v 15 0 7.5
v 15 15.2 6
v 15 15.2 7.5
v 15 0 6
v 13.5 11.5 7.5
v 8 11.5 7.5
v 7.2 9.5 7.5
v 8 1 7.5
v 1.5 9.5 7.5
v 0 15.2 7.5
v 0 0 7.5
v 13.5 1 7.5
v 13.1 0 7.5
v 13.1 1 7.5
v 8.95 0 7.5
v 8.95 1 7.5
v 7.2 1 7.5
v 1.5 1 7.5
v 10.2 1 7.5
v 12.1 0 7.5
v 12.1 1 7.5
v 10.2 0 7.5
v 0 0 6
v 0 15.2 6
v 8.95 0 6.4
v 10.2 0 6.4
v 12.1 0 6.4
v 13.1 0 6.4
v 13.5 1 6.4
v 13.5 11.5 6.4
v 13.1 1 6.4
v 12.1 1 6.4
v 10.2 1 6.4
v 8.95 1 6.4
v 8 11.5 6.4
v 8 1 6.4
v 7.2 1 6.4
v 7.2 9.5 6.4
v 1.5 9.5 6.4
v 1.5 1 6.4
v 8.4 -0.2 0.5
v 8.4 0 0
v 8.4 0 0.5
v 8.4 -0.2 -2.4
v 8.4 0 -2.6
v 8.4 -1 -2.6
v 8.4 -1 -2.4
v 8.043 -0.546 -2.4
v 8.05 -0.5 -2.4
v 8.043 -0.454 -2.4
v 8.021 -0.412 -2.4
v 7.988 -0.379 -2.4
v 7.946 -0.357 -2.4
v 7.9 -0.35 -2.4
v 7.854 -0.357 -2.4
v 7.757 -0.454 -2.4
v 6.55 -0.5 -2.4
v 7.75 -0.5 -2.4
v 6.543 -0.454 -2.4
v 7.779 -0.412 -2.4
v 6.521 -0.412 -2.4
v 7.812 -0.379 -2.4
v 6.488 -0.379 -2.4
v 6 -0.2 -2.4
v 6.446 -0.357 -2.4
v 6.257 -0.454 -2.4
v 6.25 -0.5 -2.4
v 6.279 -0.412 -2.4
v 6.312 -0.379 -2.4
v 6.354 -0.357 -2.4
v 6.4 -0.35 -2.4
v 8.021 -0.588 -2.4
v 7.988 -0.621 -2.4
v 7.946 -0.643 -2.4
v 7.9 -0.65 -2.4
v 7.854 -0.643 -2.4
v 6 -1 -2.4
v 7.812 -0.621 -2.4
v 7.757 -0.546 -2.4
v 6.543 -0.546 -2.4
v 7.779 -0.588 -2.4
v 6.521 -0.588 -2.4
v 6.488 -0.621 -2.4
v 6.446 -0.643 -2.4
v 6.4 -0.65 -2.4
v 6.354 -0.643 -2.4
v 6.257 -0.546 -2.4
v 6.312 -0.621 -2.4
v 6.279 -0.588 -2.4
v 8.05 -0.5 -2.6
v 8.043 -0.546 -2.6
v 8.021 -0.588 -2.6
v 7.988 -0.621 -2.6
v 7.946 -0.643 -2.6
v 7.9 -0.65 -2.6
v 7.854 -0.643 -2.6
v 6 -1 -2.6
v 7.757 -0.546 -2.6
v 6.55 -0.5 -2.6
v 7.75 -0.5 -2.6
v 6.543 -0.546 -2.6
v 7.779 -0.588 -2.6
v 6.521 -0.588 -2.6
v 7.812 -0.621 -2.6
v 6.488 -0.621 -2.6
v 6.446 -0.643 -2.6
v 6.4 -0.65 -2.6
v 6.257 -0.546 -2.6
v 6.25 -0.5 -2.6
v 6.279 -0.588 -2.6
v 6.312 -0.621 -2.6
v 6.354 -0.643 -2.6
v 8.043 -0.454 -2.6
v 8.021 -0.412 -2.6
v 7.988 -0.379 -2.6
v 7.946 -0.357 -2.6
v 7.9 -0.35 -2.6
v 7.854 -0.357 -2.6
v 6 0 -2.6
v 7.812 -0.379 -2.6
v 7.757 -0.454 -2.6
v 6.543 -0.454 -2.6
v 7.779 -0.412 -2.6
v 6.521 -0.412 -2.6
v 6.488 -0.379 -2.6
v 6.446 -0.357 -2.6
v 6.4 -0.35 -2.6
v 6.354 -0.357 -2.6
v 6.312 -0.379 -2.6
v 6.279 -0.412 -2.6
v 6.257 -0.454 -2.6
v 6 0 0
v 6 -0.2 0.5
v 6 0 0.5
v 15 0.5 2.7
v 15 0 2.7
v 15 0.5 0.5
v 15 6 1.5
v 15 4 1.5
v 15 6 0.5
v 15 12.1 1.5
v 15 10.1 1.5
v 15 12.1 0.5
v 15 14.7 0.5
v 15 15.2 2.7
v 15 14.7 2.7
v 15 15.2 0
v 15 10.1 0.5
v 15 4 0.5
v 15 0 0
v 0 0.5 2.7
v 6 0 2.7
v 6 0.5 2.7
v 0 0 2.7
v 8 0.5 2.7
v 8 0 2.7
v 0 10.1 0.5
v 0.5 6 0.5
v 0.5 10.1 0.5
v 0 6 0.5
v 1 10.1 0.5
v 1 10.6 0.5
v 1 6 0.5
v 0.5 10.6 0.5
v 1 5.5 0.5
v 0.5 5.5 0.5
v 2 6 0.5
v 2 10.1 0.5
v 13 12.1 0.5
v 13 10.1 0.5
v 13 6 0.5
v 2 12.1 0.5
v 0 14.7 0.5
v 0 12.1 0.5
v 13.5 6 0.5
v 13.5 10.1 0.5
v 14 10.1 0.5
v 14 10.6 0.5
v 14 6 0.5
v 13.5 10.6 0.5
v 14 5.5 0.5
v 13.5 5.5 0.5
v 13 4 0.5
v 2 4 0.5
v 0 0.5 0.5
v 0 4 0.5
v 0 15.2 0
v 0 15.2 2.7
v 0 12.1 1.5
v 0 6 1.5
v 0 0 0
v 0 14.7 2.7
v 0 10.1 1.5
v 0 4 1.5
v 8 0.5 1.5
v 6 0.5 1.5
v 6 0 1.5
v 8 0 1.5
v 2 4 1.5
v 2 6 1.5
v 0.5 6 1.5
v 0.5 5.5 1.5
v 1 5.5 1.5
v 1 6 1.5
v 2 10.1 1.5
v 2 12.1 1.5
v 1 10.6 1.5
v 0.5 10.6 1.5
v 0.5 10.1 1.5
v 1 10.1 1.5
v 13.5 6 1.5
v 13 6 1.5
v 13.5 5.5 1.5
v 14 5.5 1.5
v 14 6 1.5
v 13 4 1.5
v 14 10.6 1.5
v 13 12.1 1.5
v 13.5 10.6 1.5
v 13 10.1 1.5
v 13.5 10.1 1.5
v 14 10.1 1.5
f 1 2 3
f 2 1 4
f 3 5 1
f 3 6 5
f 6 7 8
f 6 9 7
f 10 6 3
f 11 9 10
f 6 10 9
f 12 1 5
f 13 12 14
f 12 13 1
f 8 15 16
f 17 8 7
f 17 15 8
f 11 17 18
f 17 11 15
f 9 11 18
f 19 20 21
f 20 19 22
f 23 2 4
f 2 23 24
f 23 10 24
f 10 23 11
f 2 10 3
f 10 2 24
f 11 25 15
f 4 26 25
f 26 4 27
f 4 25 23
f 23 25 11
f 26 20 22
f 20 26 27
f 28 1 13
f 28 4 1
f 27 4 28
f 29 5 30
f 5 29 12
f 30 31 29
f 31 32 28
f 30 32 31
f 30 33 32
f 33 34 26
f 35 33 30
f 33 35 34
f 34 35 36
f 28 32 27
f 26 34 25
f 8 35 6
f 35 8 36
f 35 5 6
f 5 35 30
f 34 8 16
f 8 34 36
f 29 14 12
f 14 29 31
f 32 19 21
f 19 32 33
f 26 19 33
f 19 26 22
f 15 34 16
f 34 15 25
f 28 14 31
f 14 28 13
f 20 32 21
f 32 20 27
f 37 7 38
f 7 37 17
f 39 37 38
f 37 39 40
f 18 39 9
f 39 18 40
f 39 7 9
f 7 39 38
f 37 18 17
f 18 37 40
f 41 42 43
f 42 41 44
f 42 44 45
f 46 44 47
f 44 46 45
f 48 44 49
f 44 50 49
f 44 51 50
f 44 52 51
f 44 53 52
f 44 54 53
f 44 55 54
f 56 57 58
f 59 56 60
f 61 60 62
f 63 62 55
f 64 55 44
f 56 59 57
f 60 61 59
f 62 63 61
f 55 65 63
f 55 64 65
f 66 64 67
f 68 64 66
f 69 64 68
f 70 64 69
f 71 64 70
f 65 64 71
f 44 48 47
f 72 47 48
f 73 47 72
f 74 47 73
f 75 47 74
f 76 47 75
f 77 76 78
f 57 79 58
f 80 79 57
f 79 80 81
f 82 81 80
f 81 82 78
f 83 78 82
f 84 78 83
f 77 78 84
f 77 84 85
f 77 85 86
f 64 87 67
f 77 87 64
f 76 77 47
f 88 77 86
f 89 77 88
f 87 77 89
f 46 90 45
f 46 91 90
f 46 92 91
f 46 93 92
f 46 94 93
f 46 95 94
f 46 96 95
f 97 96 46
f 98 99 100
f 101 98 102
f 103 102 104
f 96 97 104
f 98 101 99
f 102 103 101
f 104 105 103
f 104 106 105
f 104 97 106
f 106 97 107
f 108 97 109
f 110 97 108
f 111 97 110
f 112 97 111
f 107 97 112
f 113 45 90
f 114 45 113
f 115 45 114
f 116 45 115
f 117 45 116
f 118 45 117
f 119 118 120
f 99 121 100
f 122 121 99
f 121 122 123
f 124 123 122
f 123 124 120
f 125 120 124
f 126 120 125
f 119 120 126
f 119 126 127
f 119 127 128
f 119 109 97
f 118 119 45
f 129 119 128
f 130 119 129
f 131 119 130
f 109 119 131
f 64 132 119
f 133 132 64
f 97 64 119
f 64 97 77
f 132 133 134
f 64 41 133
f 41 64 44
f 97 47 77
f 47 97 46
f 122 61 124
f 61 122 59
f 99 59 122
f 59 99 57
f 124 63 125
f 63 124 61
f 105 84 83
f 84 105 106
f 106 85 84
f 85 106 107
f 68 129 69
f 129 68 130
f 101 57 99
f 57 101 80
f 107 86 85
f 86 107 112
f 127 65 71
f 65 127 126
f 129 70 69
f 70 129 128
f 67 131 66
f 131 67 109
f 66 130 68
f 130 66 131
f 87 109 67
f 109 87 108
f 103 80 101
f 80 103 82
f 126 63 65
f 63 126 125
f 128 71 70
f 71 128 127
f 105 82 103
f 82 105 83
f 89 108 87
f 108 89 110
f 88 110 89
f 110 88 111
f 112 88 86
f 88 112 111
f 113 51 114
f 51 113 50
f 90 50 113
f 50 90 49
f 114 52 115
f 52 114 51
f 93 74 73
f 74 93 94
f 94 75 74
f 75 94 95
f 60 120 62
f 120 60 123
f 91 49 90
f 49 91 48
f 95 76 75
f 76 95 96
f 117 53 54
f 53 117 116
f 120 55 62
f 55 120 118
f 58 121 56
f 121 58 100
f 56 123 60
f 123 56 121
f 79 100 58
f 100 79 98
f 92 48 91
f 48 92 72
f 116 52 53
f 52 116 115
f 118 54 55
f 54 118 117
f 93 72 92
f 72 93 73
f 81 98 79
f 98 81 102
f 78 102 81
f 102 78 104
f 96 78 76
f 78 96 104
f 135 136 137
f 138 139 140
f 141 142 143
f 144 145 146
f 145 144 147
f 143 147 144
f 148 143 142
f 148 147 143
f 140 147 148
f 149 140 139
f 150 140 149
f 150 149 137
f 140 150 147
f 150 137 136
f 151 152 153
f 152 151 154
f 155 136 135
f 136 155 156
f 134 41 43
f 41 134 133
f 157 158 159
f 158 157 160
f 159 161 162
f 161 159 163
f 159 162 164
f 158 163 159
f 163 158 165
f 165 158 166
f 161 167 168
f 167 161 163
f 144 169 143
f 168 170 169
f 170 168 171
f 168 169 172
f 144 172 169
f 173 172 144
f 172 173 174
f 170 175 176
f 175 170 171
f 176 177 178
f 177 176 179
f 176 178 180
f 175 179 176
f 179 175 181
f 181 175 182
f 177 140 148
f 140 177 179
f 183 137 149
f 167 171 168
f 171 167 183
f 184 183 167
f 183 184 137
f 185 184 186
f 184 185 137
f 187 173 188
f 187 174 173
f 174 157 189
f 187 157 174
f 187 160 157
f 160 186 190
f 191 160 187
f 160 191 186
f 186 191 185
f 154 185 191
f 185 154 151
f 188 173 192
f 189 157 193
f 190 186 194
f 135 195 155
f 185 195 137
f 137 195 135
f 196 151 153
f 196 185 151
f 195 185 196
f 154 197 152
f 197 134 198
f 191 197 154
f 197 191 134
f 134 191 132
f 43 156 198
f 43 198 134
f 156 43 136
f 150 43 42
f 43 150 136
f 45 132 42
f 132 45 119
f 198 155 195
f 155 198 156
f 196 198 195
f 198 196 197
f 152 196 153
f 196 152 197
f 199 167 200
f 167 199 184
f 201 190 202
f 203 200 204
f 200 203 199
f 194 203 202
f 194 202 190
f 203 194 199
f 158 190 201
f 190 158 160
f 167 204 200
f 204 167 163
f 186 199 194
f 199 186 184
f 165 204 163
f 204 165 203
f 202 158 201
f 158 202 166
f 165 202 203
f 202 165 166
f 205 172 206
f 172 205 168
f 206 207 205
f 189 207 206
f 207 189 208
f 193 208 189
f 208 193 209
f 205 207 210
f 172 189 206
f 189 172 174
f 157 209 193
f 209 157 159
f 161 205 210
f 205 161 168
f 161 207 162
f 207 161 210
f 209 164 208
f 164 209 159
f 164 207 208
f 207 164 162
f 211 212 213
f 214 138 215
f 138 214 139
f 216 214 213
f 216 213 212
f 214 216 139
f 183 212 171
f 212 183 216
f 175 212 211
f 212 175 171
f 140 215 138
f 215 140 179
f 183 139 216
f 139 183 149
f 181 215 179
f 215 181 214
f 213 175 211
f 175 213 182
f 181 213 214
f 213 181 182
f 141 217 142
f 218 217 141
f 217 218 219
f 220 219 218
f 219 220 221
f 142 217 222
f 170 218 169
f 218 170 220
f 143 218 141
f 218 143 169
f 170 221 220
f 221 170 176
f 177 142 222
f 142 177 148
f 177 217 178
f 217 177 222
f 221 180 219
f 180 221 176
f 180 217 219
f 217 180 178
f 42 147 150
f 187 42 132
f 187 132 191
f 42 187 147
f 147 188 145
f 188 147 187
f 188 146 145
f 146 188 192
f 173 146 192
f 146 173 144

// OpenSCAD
//the distance between two platforms might not be 6cm if Legos are used to connect. 

translate([0,0,6]){
    difference() {
        cube([15.0,15.2,1.5]);
        //arduino board
        translate([8.0,1.0,0.4]) cube(size=[5.5,10.5,1.1], center=false);
        //plugin
        translate([8.0+0.95,0.0,0.4]) cube(size=[1.25,1.0,1.1], center=false);
        //plugin2
        translate([8.0+0.95+1.25+1.9,0.0,0.4]) cube(size=[1.0,1.0,1.1], center=false);
        //breakboard
        translate([1.5,1.0,0.4]) cube(size=[5.7,8.5,1.1], center=false);
    }
}


    union(){
        cube([15.0,15.2,0.5]);
        //RGB sensor vertical attachment. RGB width = 2.0
        translate([6.0, 0-0.2, 0-2.6]) cube(size=[2.4,0.2,0.5+2.6], center=false);
        //RGB sensor horizontal
        difference(){
            translate([6.0,0-0.2-0.8,0-2.6]) cube(size=[2.4,0.8,0.2], center=false);
            //two holes. 0.2cm in y is the distance from the hole to the margin
            translate([6.0 +0.4,0-0.2-0.8 +0.5,0-2.6]) cylinder(h=0.2, d=0.3, center=false, $fn=20);
            translate([6.0+0.4 + 0.3 + 1.2, 0-0.2-0.8+0.5, 0-2.6]) cylinder(h=0.2, d=0.3, center=false, $fn=20);
        }
        //walls
        difference(){
            translate([0,0,0+0.5]) cube(size=[15.0,0.5,2.2]);
            //a hole for the wires of the battery
            //!!meausure the wire lenghth again
            translate([6.0,0,0+1.5]) cube(size=[2.0,0.5,2.2]);
        }
        translate([0,15.2-0.5,0+0.5]) cube(size=[15.0,0.5,2.2]);
        //servo: left top
        difference(){
            translate([0,4.0,0.5]) cube(size=[2,2,1.0]);
            translate([0+0.5,4.0+2.0-0.5,0.5]) cube(size=[0.5,0.5,2.0]);
            
        }
        //servo: right top
        difference(){
            translate([0,4.0+2+4.1,0.5]) cube(size=[2,2,1.0]);
            translate([0+0.5, 4.0+2+4.1,0.5]) cube(size=[0.5,0.5,2.0]);
        }
        //servo: left bottom
        difference(){
            translate([15.0-2,4.0,0.5]) cube(size=[2,2,1.0]);
            translate([15.0+0.5-2,4.0+2.0-0.5,0.5]) cube(size=[0.5,0.5,2.0]);
            
        }
        //servo: right bottom
        difference(){
            translate([15.0-2,4.0+2+4.1,0.5]) cube(size=[2,2,1.0]);
            translate([15.0-2+0.5, 4.0+2+4.1,0.5]) cube(size=[0.5,0.5,2.0]);
        }
    }
